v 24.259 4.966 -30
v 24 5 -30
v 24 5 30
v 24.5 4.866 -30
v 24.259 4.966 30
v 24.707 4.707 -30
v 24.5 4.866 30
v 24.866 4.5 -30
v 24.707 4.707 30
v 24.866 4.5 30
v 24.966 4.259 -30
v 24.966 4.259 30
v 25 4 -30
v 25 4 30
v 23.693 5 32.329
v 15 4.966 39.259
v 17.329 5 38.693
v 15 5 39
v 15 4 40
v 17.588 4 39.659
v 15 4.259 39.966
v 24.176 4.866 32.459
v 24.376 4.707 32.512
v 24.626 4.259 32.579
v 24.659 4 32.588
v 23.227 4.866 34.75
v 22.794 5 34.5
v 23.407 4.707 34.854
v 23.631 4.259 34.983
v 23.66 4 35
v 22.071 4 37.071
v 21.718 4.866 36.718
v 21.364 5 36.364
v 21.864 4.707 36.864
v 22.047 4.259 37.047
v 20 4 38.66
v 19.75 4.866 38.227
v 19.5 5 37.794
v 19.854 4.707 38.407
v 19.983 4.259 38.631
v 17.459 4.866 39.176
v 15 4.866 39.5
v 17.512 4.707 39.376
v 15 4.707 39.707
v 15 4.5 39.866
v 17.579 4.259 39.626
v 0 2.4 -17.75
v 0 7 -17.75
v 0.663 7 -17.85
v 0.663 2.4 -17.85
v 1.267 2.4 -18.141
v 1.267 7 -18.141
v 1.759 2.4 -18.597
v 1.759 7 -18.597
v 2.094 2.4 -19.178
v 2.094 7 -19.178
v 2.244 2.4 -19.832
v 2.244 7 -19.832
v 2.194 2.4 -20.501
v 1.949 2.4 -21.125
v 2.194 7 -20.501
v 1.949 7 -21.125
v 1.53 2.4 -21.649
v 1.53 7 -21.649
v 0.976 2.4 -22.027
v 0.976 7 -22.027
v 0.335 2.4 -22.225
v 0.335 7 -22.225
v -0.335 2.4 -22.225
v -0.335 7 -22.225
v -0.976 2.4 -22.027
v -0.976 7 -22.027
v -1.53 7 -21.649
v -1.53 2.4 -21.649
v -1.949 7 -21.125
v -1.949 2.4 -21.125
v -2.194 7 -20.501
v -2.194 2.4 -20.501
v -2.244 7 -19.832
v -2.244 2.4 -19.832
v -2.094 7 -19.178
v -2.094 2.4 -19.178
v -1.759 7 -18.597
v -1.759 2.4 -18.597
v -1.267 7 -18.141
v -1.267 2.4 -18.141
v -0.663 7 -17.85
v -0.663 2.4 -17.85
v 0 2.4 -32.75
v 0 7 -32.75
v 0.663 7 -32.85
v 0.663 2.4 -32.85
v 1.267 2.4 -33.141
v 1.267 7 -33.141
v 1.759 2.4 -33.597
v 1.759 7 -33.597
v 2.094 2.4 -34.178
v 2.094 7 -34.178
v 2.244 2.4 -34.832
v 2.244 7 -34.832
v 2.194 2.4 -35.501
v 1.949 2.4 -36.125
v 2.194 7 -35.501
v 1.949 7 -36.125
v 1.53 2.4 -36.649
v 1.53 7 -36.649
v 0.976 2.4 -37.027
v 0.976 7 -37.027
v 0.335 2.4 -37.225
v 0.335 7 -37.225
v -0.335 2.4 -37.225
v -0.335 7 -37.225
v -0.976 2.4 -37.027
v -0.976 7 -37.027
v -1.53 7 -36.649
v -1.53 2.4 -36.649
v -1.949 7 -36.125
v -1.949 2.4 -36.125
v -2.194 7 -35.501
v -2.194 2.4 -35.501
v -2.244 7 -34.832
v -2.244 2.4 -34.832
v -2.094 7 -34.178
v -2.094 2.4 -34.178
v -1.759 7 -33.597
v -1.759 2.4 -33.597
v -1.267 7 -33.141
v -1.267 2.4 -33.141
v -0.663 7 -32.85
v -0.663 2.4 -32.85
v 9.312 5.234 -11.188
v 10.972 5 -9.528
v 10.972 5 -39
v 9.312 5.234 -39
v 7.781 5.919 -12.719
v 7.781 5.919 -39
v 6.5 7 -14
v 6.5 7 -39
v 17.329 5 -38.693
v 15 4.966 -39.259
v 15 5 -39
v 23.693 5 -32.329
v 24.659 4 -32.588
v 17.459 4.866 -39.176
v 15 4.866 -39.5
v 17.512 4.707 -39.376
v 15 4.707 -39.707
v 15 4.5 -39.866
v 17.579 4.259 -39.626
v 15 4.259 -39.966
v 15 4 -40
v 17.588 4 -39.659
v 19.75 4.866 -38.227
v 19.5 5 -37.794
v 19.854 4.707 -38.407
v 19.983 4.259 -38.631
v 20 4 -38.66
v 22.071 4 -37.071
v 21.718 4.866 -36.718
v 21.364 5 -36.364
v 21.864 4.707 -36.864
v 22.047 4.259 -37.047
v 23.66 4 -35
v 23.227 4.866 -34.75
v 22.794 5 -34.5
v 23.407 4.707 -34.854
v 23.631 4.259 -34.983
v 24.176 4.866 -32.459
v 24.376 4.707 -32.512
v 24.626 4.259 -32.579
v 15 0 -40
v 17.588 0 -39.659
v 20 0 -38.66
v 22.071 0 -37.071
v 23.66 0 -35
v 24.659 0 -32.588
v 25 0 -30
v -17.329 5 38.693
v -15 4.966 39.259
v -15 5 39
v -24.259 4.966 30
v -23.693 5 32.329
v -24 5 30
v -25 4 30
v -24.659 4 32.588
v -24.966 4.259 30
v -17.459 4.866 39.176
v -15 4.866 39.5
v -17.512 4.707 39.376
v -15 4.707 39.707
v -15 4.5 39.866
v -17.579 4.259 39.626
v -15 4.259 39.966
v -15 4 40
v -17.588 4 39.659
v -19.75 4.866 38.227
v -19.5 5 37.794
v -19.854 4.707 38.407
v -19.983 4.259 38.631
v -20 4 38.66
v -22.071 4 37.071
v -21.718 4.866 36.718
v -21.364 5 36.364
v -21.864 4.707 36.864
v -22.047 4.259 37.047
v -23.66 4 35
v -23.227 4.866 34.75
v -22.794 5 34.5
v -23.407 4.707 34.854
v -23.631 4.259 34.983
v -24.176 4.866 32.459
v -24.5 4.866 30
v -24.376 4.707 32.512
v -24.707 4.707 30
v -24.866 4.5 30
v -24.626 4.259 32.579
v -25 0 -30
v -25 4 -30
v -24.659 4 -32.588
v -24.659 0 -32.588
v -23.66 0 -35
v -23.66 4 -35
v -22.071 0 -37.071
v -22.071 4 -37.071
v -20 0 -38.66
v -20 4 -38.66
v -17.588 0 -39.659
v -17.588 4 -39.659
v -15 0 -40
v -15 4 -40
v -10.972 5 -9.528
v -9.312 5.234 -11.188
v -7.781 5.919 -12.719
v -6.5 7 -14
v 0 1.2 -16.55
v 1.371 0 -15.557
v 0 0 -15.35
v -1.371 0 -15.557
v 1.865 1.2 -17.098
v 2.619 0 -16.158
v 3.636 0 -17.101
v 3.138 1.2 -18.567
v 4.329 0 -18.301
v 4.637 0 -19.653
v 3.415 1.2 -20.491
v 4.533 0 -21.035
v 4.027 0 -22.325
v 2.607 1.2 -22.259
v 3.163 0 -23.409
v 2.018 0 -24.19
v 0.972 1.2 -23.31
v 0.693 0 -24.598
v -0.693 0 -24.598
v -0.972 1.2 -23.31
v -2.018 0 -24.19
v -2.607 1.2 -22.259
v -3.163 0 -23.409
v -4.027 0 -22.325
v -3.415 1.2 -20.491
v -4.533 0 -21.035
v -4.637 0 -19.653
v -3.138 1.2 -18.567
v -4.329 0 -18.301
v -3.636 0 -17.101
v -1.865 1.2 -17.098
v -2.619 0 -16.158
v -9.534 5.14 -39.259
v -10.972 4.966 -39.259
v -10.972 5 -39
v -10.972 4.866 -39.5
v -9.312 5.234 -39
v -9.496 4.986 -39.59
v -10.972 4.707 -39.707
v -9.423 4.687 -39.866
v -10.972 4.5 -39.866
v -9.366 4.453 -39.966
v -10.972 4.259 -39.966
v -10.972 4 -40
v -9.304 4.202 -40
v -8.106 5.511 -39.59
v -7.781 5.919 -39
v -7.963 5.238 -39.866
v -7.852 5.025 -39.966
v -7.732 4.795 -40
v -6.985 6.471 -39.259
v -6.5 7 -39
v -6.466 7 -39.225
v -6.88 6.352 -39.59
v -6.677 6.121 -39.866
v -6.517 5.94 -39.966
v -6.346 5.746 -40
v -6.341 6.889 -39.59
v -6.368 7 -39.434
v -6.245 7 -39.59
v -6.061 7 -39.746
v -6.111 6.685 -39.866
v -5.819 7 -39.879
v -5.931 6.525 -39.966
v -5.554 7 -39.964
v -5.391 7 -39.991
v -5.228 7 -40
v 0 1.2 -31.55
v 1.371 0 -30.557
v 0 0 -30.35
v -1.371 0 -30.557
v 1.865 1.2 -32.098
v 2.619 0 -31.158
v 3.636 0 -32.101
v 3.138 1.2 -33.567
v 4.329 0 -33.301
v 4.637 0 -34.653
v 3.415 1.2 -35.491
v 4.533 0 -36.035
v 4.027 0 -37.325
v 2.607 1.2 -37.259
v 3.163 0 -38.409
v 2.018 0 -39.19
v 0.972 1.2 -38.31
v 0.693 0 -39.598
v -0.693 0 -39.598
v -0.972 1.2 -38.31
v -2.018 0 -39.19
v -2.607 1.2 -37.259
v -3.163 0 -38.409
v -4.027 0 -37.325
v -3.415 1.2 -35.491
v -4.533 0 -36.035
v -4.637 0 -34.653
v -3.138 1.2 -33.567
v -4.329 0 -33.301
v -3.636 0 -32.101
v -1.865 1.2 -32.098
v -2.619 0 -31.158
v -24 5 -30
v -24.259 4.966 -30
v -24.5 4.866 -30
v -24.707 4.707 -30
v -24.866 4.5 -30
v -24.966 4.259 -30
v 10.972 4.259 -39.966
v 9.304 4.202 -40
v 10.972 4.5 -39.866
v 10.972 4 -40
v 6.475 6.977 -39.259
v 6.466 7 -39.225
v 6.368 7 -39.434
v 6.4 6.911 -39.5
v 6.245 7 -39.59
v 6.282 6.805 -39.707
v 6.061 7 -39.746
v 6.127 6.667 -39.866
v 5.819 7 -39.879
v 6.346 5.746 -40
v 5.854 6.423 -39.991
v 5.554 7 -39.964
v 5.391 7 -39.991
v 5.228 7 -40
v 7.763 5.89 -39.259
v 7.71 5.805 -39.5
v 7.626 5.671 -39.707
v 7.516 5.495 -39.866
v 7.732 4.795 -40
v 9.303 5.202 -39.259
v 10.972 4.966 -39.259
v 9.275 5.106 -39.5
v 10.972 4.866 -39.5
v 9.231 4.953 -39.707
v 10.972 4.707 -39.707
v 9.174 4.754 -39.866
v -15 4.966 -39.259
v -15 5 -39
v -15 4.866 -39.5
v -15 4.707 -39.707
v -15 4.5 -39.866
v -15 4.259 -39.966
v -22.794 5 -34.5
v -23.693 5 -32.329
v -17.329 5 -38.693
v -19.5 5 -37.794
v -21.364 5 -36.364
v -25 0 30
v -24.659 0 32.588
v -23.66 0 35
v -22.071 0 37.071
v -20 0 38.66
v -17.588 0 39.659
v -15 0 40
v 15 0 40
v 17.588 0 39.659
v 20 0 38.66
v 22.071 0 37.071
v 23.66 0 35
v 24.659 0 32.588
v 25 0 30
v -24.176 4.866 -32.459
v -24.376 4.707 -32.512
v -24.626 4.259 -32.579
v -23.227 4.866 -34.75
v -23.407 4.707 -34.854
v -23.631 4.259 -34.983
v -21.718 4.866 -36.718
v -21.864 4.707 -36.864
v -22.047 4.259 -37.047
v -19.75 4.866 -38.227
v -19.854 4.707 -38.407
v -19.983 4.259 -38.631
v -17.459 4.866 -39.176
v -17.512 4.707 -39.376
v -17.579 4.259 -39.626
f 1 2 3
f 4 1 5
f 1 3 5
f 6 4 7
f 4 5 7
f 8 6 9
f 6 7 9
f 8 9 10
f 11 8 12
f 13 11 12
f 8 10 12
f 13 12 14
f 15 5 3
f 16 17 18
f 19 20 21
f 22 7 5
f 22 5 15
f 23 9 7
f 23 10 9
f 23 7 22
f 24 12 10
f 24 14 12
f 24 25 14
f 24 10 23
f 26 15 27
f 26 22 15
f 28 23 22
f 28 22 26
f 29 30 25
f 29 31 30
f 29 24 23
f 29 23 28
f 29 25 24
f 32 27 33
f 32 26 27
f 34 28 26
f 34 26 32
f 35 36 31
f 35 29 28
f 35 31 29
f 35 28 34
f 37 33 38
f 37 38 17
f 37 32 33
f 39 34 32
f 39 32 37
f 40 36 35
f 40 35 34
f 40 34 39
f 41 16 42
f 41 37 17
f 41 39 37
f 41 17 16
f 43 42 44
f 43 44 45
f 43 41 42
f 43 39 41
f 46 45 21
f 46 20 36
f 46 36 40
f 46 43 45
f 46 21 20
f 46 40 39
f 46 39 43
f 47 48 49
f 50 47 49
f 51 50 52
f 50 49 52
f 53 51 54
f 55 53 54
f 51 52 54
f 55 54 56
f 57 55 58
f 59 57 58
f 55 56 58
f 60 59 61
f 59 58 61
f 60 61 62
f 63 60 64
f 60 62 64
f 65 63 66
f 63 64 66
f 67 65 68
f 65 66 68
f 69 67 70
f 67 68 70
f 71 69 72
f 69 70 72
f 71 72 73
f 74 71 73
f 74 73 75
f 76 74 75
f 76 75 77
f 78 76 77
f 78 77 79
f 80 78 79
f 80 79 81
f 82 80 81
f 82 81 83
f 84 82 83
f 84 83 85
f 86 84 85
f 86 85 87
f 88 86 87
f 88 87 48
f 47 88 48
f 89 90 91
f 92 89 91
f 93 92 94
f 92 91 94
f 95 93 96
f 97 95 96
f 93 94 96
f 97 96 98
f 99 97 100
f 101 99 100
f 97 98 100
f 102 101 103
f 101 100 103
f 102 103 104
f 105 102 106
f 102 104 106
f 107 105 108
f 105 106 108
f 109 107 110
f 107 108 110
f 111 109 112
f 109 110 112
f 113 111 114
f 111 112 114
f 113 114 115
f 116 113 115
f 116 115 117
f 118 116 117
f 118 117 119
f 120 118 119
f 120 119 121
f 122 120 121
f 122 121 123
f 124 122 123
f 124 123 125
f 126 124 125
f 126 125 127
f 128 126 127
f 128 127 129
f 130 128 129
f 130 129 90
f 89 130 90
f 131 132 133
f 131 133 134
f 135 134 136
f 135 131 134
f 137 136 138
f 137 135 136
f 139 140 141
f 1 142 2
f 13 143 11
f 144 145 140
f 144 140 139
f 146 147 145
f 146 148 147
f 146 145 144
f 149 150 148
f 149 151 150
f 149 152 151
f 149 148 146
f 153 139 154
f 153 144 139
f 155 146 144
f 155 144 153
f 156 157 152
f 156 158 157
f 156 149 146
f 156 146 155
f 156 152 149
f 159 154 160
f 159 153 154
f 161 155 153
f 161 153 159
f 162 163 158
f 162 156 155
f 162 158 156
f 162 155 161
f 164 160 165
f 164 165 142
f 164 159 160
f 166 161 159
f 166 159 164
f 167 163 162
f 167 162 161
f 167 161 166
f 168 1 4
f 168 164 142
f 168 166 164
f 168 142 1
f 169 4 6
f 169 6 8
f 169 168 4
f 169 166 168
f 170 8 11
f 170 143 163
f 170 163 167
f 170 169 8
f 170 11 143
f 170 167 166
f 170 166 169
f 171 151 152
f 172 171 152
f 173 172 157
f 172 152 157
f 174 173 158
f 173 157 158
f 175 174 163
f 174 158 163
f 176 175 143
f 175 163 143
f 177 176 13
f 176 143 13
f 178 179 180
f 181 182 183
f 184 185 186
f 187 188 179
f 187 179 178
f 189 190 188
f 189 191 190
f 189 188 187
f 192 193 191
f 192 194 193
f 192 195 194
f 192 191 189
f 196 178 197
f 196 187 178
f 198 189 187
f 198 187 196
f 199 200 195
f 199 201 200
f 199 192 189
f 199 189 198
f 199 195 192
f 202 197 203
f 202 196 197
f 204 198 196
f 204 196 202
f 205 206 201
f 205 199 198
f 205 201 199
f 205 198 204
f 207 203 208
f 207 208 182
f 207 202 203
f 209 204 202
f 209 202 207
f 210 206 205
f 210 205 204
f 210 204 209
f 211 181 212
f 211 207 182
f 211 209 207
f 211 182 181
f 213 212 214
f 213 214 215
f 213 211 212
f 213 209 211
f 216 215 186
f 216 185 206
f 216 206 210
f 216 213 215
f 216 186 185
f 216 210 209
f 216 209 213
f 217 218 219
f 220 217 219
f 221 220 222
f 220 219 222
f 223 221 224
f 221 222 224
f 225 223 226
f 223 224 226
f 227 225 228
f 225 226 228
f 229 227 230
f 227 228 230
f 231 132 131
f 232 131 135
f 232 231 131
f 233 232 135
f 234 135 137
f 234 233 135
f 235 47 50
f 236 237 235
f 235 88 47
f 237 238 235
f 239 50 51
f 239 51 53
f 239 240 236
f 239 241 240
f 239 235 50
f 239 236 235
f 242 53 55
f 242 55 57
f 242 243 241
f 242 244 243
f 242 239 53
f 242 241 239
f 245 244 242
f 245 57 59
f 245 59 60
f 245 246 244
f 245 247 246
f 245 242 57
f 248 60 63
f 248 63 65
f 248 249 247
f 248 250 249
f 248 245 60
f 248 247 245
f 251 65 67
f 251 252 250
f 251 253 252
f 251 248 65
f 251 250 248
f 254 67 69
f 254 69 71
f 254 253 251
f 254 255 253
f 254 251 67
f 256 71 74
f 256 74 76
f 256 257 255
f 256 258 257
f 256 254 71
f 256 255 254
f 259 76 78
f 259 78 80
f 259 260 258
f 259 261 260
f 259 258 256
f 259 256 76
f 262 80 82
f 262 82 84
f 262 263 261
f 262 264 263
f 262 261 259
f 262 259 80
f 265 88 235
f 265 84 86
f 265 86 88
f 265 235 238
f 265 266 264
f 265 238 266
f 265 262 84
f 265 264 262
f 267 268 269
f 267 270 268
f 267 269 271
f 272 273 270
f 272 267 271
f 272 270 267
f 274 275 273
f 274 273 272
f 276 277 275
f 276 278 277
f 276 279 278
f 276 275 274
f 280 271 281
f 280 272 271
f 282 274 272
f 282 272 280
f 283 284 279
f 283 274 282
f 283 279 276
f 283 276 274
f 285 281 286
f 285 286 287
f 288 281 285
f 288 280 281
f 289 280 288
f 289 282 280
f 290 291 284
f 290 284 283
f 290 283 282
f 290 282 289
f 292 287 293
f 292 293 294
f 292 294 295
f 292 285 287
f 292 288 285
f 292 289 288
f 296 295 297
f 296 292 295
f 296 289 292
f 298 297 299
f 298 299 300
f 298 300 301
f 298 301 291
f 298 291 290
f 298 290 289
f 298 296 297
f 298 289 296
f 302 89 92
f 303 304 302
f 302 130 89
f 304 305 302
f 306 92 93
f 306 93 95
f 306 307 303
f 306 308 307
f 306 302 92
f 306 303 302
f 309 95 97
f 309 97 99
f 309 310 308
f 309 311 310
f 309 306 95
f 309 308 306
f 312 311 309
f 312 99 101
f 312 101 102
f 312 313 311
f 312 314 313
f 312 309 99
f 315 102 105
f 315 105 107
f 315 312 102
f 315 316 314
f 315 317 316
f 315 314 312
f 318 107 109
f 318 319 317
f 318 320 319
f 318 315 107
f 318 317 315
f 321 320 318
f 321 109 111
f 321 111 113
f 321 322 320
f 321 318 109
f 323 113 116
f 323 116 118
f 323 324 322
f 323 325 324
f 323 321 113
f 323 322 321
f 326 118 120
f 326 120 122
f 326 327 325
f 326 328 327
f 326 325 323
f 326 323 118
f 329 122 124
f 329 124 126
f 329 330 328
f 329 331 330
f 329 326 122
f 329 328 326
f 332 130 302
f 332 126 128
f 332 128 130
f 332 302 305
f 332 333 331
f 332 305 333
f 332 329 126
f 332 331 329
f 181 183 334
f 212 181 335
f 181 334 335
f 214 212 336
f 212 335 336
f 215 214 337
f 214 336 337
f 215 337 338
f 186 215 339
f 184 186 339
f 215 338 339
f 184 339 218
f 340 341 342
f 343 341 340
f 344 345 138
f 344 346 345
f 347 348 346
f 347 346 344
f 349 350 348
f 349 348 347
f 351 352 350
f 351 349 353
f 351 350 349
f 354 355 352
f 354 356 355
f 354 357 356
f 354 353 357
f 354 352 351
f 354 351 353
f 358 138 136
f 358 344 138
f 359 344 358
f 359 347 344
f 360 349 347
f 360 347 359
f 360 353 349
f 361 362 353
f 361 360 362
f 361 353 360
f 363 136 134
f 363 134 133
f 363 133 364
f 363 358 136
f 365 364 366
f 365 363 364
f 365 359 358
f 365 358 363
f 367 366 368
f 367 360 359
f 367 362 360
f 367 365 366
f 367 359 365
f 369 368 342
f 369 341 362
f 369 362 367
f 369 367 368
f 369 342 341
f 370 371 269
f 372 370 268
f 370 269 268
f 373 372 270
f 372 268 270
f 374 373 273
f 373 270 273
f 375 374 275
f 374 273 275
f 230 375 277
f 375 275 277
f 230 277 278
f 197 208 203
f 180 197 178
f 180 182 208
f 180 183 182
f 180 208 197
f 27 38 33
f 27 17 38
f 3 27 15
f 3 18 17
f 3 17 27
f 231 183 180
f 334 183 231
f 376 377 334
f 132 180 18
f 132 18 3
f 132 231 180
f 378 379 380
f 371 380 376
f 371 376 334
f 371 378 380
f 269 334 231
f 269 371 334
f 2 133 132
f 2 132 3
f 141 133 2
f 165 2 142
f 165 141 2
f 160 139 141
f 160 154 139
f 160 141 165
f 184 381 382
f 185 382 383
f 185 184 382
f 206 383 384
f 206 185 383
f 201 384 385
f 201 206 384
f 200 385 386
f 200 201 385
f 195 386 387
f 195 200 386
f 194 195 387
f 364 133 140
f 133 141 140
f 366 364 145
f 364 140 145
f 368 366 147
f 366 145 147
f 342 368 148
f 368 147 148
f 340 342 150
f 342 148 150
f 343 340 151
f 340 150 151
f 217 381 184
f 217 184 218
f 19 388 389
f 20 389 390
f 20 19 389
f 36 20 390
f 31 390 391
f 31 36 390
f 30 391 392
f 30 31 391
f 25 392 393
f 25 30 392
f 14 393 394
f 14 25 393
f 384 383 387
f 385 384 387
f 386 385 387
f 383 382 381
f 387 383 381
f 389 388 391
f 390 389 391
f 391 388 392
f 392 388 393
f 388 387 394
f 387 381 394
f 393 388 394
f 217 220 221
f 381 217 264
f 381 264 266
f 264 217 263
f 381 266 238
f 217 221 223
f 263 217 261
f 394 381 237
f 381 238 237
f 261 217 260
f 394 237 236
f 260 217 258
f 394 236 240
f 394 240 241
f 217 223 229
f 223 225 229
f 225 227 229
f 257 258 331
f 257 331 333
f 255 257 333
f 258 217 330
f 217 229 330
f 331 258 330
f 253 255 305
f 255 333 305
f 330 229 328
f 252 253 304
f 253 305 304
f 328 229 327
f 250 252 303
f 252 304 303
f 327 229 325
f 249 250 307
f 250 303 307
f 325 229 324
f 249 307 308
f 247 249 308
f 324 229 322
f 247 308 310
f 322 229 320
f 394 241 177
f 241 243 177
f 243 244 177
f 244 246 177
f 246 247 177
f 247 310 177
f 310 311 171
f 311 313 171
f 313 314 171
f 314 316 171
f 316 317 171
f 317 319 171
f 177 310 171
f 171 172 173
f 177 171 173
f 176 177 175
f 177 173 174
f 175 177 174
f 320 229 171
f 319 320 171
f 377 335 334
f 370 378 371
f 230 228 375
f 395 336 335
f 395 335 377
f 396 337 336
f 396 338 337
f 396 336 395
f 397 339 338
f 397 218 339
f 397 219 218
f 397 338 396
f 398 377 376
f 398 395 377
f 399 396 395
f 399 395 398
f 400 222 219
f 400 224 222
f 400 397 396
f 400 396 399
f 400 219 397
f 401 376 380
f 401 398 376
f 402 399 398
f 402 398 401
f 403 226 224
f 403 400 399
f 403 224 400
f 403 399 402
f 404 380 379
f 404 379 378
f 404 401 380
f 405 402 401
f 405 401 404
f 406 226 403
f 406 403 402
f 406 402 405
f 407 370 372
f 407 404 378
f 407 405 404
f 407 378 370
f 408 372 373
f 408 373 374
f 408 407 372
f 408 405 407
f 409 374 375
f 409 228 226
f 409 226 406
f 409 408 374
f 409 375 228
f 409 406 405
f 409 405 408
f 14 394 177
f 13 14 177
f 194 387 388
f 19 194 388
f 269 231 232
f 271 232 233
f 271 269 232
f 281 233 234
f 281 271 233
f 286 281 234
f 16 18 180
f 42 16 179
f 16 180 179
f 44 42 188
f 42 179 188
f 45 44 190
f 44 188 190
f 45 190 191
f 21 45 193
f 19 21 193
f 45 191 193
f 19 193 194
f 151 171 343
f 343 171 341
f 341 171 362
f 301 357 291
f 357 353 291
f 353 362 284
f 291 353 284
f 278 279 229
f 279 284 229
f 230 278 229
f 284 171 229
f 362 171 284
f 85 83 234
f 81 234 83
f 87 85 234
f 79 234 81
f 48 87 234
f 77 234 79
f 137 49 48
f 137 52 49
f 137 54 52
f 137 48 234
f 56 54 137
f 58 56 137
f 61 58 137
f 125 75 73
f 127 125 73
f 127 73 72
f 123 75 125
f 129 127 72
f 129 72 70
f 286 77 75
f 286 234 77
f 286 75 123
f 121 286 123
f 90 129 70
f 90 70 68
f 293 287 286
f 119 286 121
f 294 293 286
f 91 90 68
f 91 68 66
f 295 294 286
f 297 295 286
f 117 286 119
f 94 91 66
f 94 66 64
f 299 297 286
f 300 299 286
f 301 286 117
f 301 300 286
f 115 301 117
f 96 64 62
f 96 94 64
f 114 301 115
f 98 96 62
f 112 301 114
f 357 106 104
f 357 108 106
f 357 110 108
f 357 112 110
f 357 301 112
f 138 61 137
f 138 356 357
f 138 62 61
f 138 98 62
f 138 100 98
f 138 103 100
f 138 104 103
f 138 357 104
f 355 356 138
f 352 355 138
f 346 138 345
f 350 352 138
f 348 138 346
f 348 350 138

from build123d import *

# Parameters (mm, degrees)
SKETCH1_W           = 50
SKETCH1_H           = 80
BOSS_EXTRUDE1_DEPTH = 5
SKETCH2_W           = 13
SKETCH2_H           = 26
BOSS_EXTRUDE2_DEPTH = 2
SKETCH3_R           = 2.25
CUT_EXTRUDE1_DEPTH  = 48.68647607
FILLET1_R           = 10
FILLET2_R           = 6
FILLET3_R           = 1
CHAMFER1_SIZE       = 2.4


with BuildPart() as part:
    # Sketch1 → Boss-Extrude1 (new body)
    with BuildSketch(Plane(origin=(0, 0, 0), x_dir=(1, 0, 0), z_dir=(0, 1, 0))):
        Rectangle(SKETCH1_W, SKETCH1_H)
    extrude(amount=BOSS_EXTRUDE1_DEPTH)

    # Sketch2 → Boss-Extrude2 (add)
    with BuildSketch(Plane(origin=(0, 5, 0), x_dir=(1, 0, 0), z_dir=(0, 1, 0))):
        with Locations((0, 27)):
            Rectangle(SKETCH2_W, SKETCH2_H)
    extrude(amount=BOSS_EXTRUDE2_DEPTH)

    # Sketch3 → Cut-Extrude1 (cut, through all)
    with BuildSketch(Plane(origin=(0, 7, 0), x_dir=(1, 0, 0), z_dir=(0, 1, 0))):
        with Locations(Location((0, 35, 0), (0, 0, 270))):
            Circle(SKETCH3_R)
        with Locations(Location((0, 20, 0), (0, 0, 270))):
            Circle(SKETCH3_R)
    extrude(amount=-CUT_EXTRUDE1_DEPTH, mode=Mode.SUBTRACT)

    # Fillet1
    fillet1_edges = [part.edges().sort_by_distance(p)[0] for p in [
        (25, 2.5, 40),
        (-25, 2.5, 40),
        (-25, 2.5, -40),
        (25, 2.5, -40),
    ]]
    fillet(fillet1_edges, radius=FILLET1_R)

    # Fillet2
    # the kernel refuses this fillet: 6 mm, written as the material it adds along each edge
    with BuildSketch(Plane(origin=(6.5, 5, -14), x_dir=(1, 0, 0), z_dir=(0, 0, -1)), Plane(origin=(-6.5, 5, -40), x_dir=(-1, 0, 0), z_dir=(0, 0, 1))) as fillet2_piece_1:
        with BuildLine():
            CenterArc((4.472135955, -6), FILLET2_R, 90, 48.189685104)
            Line((0, -2), (-0.089442719, -1.92))
            ThreePointArc((-0.089442719, -1.92), (-0.12, -1), (-0.12, 0))
            Line((-0.12, 0), (0, 0.12))
            Line((0, 0.12), (4.472135955, 0.12))
            Line((4.472135955, 0.12), (4.472135955, 0))
        make_face()
    extrude(amount=26)
    with BuildSketch(Plane(origin=(-6.5, 5, -14), x_dir=(0, 0, 1), z_dir=(1, 0, 0))) as fillet2_piece_2:
        with BuildLine():
            CenterArc((4.472135955, -6), FILLET2_R, 90, 48.189685104)
            Line((0, -2), (-0.089442719, -1.92))
            ThreePointArc((-0.089442719, -1.92), (-0.12, -1), (-0.12, 0))
            Line((-0.12, 0), (0, 0.12))
            Line((0, 0.12), (4.472135955, 0.12))
            Line((4.472135955, 0.12), (4.472135955, 0))
        make_face()
    extrude(amount=13)
    with BuildSketch(Plane(origin=(-6.5, 5, -14), x_dir=(0, 0, 1), z_dir=(1, 0, 0))) as fillet2_piece_3a_section:
        with BuildLine():
            CenterArc((4.472135955, -6), FILLET2_R, 90, 48.189685104)
            Line((0, -2), (-0.089442719, -1.92))
            ThreePointArc((-0.089442719, -1.92), (-0.12, -1), (-0.12, 0))
            Line((-0.12, 0), (0, 0.12))
            Line((0, 0.12), (4.472135955, 0.12))
            Line((4.472135955, 0.12), (4.472135955, 0))
        make_face()
    fillet2_piece_3a = extrude(amount=24.180339887, mode=Mode.PRIVATE)
    fillet2_piece_3a = split(fillet2_piece_3a, bisect_by=Plane(origin=(6.5, 5.502082099, -12.82079949), z_dir=(1, 0, 0)), keep=Keep.TOP, mode=Mode.PRIVATE)
    with BuildSketch(Plane(origin=(6.5, 5, -2.819660113), x_dir=(1, 0, 0), z_dir=(0, 0, -1))) as fillet2_piece_3b_section:
        with BuildLine():
            CenterArc((4.472135955, -6), FILLET2_R, 90, 48.189685104)
            Line((0, -2), (-0.089442719, -1.92))
            ThreePointArc((-0.089442719, -1.92), (-0.12, -1), (-0.12, 0))
            Line((-0.12, 0), (0, 0.12))
            Line((0, 0.12), (4.472135955, 0.12))
            Line((4.472135955, 0.12), (4.472135955, 0))
        make_face()
    fillet2_piece_3b = extrude(amount=37.180339887, mode=Mode.PRIVATE)
    fillet2_piece_3b = split(fillet2_piece_3b, bisect_by=Plane(origin=(7.67920051, 5.502082099, -14), z_dir=(0, 0, 1)), keep=Keep.TOP, mode=Mode.PRIVATE)
    fillet2_piece_3 = fillet2_piece_3a & fillet2_piece_3b
    add(fillet2_piece_3)
    with BuildSketch(Plane(origin=(-6.5, 5, -40), x_dir=(-1, 0, 0), z_dir=(0, 0, 1))) as fillet2_piece_4a_section:
        with BuildLine():
            CenterArc((4.472135955, -6), FILLET2_R, 90, 48.189685104)
            Line((0, -2), (-0.089442719, -1.92))
            ThreePointArc((-0.089442719, -1.92), (-0.12, -1), (-0.12, 0))
            Line((-0.12, 0), (0, 0.12))
            Line((0, 0.12), (4.472135955, 0.12))
            Line((4.472135955, 0.12), (4.472135955, 0))
        make_face()
    fillet2_piece_4a = extrude(amount=37.180339887, mode=Mode.PRIVATE)
    fillet2_piece_4a = split(fillet2_piece_4a, bisect_by=Plane(origin=(-7.67920051, 5.502082099, -14), z_dir=(0, 0, 1)), keep=Keep.TOP, mode=Mode.PRIVATE)
    with BuildSketch(Plane(origin=(-17.680339887, 5, -14), x_dir=(0, 0, 1), z_dir=(1, 0, 0))) as fillet2_piece_4b_section:
        with BuildLine():
            CenterArc((4.472135955, -6), FILLET2_R, 90, 48.189685104)
            Line((0, -2), (-0.089442719, -1.92))
            ThreePointArc((-0.089442719, -1.92), (-0.12, -1), (-0.12, 0))
            Line((-0.12, 0), (0, 0.12))
            Line((0, 0.12), (4.472135955, 0.12))
            Line((4.472135955, 0.12), (4.472135955, 0))
        make_face()
    fillet2_piece_4b = extrude(amount=24.180339887, mode=Mode.PRIVATE)
    fillet2_piece_4b = split(fillet2_piece_4b, bisect_by=Plane(origin=(-6.5, 5.502082099, -12.82079949), z_dir=(-1, 0, 0)), keep=Keep.TOP, mode=Mode.PRIVATE)
    fillet2_piece_4 = fillet2_piece_4a & fillet2_piece_4b
    add(fillet2_piece_4)

    # Fillet3
    fillet3_edges = [part.edges().sort_by_distance(p)[0] for p in [
        (12.986067978, 5, -40),
        (25, 5, 0),
        (-25, 5, 0),
        (0, 5, 40),
        (-22.071067812, 5, -37.071067812),
        (-22.071067812, 5, 37.071067812),
        (22.071067812, 5, 37.071067812),
        (22.071067812, 5, -37.071067812),
        (-12.986067977, 5, -40),
        (8.522646212, 5.522774425, -40),
        (-8.522646212, 5.522774425, -40),
    ]]
    fillet(fillet3_edges, radius=FILLET3_R)

    # Chamfer1
    chamfer1_edges = [part.edges().sort_by_distance(p)[0] for p in [
        (0, 0, -37.25),
        (0, 0, -22.25),
    ]]
    chamfer(chamfer1_edges, length=CHAMFER1_SIZE)


solid = part.part
